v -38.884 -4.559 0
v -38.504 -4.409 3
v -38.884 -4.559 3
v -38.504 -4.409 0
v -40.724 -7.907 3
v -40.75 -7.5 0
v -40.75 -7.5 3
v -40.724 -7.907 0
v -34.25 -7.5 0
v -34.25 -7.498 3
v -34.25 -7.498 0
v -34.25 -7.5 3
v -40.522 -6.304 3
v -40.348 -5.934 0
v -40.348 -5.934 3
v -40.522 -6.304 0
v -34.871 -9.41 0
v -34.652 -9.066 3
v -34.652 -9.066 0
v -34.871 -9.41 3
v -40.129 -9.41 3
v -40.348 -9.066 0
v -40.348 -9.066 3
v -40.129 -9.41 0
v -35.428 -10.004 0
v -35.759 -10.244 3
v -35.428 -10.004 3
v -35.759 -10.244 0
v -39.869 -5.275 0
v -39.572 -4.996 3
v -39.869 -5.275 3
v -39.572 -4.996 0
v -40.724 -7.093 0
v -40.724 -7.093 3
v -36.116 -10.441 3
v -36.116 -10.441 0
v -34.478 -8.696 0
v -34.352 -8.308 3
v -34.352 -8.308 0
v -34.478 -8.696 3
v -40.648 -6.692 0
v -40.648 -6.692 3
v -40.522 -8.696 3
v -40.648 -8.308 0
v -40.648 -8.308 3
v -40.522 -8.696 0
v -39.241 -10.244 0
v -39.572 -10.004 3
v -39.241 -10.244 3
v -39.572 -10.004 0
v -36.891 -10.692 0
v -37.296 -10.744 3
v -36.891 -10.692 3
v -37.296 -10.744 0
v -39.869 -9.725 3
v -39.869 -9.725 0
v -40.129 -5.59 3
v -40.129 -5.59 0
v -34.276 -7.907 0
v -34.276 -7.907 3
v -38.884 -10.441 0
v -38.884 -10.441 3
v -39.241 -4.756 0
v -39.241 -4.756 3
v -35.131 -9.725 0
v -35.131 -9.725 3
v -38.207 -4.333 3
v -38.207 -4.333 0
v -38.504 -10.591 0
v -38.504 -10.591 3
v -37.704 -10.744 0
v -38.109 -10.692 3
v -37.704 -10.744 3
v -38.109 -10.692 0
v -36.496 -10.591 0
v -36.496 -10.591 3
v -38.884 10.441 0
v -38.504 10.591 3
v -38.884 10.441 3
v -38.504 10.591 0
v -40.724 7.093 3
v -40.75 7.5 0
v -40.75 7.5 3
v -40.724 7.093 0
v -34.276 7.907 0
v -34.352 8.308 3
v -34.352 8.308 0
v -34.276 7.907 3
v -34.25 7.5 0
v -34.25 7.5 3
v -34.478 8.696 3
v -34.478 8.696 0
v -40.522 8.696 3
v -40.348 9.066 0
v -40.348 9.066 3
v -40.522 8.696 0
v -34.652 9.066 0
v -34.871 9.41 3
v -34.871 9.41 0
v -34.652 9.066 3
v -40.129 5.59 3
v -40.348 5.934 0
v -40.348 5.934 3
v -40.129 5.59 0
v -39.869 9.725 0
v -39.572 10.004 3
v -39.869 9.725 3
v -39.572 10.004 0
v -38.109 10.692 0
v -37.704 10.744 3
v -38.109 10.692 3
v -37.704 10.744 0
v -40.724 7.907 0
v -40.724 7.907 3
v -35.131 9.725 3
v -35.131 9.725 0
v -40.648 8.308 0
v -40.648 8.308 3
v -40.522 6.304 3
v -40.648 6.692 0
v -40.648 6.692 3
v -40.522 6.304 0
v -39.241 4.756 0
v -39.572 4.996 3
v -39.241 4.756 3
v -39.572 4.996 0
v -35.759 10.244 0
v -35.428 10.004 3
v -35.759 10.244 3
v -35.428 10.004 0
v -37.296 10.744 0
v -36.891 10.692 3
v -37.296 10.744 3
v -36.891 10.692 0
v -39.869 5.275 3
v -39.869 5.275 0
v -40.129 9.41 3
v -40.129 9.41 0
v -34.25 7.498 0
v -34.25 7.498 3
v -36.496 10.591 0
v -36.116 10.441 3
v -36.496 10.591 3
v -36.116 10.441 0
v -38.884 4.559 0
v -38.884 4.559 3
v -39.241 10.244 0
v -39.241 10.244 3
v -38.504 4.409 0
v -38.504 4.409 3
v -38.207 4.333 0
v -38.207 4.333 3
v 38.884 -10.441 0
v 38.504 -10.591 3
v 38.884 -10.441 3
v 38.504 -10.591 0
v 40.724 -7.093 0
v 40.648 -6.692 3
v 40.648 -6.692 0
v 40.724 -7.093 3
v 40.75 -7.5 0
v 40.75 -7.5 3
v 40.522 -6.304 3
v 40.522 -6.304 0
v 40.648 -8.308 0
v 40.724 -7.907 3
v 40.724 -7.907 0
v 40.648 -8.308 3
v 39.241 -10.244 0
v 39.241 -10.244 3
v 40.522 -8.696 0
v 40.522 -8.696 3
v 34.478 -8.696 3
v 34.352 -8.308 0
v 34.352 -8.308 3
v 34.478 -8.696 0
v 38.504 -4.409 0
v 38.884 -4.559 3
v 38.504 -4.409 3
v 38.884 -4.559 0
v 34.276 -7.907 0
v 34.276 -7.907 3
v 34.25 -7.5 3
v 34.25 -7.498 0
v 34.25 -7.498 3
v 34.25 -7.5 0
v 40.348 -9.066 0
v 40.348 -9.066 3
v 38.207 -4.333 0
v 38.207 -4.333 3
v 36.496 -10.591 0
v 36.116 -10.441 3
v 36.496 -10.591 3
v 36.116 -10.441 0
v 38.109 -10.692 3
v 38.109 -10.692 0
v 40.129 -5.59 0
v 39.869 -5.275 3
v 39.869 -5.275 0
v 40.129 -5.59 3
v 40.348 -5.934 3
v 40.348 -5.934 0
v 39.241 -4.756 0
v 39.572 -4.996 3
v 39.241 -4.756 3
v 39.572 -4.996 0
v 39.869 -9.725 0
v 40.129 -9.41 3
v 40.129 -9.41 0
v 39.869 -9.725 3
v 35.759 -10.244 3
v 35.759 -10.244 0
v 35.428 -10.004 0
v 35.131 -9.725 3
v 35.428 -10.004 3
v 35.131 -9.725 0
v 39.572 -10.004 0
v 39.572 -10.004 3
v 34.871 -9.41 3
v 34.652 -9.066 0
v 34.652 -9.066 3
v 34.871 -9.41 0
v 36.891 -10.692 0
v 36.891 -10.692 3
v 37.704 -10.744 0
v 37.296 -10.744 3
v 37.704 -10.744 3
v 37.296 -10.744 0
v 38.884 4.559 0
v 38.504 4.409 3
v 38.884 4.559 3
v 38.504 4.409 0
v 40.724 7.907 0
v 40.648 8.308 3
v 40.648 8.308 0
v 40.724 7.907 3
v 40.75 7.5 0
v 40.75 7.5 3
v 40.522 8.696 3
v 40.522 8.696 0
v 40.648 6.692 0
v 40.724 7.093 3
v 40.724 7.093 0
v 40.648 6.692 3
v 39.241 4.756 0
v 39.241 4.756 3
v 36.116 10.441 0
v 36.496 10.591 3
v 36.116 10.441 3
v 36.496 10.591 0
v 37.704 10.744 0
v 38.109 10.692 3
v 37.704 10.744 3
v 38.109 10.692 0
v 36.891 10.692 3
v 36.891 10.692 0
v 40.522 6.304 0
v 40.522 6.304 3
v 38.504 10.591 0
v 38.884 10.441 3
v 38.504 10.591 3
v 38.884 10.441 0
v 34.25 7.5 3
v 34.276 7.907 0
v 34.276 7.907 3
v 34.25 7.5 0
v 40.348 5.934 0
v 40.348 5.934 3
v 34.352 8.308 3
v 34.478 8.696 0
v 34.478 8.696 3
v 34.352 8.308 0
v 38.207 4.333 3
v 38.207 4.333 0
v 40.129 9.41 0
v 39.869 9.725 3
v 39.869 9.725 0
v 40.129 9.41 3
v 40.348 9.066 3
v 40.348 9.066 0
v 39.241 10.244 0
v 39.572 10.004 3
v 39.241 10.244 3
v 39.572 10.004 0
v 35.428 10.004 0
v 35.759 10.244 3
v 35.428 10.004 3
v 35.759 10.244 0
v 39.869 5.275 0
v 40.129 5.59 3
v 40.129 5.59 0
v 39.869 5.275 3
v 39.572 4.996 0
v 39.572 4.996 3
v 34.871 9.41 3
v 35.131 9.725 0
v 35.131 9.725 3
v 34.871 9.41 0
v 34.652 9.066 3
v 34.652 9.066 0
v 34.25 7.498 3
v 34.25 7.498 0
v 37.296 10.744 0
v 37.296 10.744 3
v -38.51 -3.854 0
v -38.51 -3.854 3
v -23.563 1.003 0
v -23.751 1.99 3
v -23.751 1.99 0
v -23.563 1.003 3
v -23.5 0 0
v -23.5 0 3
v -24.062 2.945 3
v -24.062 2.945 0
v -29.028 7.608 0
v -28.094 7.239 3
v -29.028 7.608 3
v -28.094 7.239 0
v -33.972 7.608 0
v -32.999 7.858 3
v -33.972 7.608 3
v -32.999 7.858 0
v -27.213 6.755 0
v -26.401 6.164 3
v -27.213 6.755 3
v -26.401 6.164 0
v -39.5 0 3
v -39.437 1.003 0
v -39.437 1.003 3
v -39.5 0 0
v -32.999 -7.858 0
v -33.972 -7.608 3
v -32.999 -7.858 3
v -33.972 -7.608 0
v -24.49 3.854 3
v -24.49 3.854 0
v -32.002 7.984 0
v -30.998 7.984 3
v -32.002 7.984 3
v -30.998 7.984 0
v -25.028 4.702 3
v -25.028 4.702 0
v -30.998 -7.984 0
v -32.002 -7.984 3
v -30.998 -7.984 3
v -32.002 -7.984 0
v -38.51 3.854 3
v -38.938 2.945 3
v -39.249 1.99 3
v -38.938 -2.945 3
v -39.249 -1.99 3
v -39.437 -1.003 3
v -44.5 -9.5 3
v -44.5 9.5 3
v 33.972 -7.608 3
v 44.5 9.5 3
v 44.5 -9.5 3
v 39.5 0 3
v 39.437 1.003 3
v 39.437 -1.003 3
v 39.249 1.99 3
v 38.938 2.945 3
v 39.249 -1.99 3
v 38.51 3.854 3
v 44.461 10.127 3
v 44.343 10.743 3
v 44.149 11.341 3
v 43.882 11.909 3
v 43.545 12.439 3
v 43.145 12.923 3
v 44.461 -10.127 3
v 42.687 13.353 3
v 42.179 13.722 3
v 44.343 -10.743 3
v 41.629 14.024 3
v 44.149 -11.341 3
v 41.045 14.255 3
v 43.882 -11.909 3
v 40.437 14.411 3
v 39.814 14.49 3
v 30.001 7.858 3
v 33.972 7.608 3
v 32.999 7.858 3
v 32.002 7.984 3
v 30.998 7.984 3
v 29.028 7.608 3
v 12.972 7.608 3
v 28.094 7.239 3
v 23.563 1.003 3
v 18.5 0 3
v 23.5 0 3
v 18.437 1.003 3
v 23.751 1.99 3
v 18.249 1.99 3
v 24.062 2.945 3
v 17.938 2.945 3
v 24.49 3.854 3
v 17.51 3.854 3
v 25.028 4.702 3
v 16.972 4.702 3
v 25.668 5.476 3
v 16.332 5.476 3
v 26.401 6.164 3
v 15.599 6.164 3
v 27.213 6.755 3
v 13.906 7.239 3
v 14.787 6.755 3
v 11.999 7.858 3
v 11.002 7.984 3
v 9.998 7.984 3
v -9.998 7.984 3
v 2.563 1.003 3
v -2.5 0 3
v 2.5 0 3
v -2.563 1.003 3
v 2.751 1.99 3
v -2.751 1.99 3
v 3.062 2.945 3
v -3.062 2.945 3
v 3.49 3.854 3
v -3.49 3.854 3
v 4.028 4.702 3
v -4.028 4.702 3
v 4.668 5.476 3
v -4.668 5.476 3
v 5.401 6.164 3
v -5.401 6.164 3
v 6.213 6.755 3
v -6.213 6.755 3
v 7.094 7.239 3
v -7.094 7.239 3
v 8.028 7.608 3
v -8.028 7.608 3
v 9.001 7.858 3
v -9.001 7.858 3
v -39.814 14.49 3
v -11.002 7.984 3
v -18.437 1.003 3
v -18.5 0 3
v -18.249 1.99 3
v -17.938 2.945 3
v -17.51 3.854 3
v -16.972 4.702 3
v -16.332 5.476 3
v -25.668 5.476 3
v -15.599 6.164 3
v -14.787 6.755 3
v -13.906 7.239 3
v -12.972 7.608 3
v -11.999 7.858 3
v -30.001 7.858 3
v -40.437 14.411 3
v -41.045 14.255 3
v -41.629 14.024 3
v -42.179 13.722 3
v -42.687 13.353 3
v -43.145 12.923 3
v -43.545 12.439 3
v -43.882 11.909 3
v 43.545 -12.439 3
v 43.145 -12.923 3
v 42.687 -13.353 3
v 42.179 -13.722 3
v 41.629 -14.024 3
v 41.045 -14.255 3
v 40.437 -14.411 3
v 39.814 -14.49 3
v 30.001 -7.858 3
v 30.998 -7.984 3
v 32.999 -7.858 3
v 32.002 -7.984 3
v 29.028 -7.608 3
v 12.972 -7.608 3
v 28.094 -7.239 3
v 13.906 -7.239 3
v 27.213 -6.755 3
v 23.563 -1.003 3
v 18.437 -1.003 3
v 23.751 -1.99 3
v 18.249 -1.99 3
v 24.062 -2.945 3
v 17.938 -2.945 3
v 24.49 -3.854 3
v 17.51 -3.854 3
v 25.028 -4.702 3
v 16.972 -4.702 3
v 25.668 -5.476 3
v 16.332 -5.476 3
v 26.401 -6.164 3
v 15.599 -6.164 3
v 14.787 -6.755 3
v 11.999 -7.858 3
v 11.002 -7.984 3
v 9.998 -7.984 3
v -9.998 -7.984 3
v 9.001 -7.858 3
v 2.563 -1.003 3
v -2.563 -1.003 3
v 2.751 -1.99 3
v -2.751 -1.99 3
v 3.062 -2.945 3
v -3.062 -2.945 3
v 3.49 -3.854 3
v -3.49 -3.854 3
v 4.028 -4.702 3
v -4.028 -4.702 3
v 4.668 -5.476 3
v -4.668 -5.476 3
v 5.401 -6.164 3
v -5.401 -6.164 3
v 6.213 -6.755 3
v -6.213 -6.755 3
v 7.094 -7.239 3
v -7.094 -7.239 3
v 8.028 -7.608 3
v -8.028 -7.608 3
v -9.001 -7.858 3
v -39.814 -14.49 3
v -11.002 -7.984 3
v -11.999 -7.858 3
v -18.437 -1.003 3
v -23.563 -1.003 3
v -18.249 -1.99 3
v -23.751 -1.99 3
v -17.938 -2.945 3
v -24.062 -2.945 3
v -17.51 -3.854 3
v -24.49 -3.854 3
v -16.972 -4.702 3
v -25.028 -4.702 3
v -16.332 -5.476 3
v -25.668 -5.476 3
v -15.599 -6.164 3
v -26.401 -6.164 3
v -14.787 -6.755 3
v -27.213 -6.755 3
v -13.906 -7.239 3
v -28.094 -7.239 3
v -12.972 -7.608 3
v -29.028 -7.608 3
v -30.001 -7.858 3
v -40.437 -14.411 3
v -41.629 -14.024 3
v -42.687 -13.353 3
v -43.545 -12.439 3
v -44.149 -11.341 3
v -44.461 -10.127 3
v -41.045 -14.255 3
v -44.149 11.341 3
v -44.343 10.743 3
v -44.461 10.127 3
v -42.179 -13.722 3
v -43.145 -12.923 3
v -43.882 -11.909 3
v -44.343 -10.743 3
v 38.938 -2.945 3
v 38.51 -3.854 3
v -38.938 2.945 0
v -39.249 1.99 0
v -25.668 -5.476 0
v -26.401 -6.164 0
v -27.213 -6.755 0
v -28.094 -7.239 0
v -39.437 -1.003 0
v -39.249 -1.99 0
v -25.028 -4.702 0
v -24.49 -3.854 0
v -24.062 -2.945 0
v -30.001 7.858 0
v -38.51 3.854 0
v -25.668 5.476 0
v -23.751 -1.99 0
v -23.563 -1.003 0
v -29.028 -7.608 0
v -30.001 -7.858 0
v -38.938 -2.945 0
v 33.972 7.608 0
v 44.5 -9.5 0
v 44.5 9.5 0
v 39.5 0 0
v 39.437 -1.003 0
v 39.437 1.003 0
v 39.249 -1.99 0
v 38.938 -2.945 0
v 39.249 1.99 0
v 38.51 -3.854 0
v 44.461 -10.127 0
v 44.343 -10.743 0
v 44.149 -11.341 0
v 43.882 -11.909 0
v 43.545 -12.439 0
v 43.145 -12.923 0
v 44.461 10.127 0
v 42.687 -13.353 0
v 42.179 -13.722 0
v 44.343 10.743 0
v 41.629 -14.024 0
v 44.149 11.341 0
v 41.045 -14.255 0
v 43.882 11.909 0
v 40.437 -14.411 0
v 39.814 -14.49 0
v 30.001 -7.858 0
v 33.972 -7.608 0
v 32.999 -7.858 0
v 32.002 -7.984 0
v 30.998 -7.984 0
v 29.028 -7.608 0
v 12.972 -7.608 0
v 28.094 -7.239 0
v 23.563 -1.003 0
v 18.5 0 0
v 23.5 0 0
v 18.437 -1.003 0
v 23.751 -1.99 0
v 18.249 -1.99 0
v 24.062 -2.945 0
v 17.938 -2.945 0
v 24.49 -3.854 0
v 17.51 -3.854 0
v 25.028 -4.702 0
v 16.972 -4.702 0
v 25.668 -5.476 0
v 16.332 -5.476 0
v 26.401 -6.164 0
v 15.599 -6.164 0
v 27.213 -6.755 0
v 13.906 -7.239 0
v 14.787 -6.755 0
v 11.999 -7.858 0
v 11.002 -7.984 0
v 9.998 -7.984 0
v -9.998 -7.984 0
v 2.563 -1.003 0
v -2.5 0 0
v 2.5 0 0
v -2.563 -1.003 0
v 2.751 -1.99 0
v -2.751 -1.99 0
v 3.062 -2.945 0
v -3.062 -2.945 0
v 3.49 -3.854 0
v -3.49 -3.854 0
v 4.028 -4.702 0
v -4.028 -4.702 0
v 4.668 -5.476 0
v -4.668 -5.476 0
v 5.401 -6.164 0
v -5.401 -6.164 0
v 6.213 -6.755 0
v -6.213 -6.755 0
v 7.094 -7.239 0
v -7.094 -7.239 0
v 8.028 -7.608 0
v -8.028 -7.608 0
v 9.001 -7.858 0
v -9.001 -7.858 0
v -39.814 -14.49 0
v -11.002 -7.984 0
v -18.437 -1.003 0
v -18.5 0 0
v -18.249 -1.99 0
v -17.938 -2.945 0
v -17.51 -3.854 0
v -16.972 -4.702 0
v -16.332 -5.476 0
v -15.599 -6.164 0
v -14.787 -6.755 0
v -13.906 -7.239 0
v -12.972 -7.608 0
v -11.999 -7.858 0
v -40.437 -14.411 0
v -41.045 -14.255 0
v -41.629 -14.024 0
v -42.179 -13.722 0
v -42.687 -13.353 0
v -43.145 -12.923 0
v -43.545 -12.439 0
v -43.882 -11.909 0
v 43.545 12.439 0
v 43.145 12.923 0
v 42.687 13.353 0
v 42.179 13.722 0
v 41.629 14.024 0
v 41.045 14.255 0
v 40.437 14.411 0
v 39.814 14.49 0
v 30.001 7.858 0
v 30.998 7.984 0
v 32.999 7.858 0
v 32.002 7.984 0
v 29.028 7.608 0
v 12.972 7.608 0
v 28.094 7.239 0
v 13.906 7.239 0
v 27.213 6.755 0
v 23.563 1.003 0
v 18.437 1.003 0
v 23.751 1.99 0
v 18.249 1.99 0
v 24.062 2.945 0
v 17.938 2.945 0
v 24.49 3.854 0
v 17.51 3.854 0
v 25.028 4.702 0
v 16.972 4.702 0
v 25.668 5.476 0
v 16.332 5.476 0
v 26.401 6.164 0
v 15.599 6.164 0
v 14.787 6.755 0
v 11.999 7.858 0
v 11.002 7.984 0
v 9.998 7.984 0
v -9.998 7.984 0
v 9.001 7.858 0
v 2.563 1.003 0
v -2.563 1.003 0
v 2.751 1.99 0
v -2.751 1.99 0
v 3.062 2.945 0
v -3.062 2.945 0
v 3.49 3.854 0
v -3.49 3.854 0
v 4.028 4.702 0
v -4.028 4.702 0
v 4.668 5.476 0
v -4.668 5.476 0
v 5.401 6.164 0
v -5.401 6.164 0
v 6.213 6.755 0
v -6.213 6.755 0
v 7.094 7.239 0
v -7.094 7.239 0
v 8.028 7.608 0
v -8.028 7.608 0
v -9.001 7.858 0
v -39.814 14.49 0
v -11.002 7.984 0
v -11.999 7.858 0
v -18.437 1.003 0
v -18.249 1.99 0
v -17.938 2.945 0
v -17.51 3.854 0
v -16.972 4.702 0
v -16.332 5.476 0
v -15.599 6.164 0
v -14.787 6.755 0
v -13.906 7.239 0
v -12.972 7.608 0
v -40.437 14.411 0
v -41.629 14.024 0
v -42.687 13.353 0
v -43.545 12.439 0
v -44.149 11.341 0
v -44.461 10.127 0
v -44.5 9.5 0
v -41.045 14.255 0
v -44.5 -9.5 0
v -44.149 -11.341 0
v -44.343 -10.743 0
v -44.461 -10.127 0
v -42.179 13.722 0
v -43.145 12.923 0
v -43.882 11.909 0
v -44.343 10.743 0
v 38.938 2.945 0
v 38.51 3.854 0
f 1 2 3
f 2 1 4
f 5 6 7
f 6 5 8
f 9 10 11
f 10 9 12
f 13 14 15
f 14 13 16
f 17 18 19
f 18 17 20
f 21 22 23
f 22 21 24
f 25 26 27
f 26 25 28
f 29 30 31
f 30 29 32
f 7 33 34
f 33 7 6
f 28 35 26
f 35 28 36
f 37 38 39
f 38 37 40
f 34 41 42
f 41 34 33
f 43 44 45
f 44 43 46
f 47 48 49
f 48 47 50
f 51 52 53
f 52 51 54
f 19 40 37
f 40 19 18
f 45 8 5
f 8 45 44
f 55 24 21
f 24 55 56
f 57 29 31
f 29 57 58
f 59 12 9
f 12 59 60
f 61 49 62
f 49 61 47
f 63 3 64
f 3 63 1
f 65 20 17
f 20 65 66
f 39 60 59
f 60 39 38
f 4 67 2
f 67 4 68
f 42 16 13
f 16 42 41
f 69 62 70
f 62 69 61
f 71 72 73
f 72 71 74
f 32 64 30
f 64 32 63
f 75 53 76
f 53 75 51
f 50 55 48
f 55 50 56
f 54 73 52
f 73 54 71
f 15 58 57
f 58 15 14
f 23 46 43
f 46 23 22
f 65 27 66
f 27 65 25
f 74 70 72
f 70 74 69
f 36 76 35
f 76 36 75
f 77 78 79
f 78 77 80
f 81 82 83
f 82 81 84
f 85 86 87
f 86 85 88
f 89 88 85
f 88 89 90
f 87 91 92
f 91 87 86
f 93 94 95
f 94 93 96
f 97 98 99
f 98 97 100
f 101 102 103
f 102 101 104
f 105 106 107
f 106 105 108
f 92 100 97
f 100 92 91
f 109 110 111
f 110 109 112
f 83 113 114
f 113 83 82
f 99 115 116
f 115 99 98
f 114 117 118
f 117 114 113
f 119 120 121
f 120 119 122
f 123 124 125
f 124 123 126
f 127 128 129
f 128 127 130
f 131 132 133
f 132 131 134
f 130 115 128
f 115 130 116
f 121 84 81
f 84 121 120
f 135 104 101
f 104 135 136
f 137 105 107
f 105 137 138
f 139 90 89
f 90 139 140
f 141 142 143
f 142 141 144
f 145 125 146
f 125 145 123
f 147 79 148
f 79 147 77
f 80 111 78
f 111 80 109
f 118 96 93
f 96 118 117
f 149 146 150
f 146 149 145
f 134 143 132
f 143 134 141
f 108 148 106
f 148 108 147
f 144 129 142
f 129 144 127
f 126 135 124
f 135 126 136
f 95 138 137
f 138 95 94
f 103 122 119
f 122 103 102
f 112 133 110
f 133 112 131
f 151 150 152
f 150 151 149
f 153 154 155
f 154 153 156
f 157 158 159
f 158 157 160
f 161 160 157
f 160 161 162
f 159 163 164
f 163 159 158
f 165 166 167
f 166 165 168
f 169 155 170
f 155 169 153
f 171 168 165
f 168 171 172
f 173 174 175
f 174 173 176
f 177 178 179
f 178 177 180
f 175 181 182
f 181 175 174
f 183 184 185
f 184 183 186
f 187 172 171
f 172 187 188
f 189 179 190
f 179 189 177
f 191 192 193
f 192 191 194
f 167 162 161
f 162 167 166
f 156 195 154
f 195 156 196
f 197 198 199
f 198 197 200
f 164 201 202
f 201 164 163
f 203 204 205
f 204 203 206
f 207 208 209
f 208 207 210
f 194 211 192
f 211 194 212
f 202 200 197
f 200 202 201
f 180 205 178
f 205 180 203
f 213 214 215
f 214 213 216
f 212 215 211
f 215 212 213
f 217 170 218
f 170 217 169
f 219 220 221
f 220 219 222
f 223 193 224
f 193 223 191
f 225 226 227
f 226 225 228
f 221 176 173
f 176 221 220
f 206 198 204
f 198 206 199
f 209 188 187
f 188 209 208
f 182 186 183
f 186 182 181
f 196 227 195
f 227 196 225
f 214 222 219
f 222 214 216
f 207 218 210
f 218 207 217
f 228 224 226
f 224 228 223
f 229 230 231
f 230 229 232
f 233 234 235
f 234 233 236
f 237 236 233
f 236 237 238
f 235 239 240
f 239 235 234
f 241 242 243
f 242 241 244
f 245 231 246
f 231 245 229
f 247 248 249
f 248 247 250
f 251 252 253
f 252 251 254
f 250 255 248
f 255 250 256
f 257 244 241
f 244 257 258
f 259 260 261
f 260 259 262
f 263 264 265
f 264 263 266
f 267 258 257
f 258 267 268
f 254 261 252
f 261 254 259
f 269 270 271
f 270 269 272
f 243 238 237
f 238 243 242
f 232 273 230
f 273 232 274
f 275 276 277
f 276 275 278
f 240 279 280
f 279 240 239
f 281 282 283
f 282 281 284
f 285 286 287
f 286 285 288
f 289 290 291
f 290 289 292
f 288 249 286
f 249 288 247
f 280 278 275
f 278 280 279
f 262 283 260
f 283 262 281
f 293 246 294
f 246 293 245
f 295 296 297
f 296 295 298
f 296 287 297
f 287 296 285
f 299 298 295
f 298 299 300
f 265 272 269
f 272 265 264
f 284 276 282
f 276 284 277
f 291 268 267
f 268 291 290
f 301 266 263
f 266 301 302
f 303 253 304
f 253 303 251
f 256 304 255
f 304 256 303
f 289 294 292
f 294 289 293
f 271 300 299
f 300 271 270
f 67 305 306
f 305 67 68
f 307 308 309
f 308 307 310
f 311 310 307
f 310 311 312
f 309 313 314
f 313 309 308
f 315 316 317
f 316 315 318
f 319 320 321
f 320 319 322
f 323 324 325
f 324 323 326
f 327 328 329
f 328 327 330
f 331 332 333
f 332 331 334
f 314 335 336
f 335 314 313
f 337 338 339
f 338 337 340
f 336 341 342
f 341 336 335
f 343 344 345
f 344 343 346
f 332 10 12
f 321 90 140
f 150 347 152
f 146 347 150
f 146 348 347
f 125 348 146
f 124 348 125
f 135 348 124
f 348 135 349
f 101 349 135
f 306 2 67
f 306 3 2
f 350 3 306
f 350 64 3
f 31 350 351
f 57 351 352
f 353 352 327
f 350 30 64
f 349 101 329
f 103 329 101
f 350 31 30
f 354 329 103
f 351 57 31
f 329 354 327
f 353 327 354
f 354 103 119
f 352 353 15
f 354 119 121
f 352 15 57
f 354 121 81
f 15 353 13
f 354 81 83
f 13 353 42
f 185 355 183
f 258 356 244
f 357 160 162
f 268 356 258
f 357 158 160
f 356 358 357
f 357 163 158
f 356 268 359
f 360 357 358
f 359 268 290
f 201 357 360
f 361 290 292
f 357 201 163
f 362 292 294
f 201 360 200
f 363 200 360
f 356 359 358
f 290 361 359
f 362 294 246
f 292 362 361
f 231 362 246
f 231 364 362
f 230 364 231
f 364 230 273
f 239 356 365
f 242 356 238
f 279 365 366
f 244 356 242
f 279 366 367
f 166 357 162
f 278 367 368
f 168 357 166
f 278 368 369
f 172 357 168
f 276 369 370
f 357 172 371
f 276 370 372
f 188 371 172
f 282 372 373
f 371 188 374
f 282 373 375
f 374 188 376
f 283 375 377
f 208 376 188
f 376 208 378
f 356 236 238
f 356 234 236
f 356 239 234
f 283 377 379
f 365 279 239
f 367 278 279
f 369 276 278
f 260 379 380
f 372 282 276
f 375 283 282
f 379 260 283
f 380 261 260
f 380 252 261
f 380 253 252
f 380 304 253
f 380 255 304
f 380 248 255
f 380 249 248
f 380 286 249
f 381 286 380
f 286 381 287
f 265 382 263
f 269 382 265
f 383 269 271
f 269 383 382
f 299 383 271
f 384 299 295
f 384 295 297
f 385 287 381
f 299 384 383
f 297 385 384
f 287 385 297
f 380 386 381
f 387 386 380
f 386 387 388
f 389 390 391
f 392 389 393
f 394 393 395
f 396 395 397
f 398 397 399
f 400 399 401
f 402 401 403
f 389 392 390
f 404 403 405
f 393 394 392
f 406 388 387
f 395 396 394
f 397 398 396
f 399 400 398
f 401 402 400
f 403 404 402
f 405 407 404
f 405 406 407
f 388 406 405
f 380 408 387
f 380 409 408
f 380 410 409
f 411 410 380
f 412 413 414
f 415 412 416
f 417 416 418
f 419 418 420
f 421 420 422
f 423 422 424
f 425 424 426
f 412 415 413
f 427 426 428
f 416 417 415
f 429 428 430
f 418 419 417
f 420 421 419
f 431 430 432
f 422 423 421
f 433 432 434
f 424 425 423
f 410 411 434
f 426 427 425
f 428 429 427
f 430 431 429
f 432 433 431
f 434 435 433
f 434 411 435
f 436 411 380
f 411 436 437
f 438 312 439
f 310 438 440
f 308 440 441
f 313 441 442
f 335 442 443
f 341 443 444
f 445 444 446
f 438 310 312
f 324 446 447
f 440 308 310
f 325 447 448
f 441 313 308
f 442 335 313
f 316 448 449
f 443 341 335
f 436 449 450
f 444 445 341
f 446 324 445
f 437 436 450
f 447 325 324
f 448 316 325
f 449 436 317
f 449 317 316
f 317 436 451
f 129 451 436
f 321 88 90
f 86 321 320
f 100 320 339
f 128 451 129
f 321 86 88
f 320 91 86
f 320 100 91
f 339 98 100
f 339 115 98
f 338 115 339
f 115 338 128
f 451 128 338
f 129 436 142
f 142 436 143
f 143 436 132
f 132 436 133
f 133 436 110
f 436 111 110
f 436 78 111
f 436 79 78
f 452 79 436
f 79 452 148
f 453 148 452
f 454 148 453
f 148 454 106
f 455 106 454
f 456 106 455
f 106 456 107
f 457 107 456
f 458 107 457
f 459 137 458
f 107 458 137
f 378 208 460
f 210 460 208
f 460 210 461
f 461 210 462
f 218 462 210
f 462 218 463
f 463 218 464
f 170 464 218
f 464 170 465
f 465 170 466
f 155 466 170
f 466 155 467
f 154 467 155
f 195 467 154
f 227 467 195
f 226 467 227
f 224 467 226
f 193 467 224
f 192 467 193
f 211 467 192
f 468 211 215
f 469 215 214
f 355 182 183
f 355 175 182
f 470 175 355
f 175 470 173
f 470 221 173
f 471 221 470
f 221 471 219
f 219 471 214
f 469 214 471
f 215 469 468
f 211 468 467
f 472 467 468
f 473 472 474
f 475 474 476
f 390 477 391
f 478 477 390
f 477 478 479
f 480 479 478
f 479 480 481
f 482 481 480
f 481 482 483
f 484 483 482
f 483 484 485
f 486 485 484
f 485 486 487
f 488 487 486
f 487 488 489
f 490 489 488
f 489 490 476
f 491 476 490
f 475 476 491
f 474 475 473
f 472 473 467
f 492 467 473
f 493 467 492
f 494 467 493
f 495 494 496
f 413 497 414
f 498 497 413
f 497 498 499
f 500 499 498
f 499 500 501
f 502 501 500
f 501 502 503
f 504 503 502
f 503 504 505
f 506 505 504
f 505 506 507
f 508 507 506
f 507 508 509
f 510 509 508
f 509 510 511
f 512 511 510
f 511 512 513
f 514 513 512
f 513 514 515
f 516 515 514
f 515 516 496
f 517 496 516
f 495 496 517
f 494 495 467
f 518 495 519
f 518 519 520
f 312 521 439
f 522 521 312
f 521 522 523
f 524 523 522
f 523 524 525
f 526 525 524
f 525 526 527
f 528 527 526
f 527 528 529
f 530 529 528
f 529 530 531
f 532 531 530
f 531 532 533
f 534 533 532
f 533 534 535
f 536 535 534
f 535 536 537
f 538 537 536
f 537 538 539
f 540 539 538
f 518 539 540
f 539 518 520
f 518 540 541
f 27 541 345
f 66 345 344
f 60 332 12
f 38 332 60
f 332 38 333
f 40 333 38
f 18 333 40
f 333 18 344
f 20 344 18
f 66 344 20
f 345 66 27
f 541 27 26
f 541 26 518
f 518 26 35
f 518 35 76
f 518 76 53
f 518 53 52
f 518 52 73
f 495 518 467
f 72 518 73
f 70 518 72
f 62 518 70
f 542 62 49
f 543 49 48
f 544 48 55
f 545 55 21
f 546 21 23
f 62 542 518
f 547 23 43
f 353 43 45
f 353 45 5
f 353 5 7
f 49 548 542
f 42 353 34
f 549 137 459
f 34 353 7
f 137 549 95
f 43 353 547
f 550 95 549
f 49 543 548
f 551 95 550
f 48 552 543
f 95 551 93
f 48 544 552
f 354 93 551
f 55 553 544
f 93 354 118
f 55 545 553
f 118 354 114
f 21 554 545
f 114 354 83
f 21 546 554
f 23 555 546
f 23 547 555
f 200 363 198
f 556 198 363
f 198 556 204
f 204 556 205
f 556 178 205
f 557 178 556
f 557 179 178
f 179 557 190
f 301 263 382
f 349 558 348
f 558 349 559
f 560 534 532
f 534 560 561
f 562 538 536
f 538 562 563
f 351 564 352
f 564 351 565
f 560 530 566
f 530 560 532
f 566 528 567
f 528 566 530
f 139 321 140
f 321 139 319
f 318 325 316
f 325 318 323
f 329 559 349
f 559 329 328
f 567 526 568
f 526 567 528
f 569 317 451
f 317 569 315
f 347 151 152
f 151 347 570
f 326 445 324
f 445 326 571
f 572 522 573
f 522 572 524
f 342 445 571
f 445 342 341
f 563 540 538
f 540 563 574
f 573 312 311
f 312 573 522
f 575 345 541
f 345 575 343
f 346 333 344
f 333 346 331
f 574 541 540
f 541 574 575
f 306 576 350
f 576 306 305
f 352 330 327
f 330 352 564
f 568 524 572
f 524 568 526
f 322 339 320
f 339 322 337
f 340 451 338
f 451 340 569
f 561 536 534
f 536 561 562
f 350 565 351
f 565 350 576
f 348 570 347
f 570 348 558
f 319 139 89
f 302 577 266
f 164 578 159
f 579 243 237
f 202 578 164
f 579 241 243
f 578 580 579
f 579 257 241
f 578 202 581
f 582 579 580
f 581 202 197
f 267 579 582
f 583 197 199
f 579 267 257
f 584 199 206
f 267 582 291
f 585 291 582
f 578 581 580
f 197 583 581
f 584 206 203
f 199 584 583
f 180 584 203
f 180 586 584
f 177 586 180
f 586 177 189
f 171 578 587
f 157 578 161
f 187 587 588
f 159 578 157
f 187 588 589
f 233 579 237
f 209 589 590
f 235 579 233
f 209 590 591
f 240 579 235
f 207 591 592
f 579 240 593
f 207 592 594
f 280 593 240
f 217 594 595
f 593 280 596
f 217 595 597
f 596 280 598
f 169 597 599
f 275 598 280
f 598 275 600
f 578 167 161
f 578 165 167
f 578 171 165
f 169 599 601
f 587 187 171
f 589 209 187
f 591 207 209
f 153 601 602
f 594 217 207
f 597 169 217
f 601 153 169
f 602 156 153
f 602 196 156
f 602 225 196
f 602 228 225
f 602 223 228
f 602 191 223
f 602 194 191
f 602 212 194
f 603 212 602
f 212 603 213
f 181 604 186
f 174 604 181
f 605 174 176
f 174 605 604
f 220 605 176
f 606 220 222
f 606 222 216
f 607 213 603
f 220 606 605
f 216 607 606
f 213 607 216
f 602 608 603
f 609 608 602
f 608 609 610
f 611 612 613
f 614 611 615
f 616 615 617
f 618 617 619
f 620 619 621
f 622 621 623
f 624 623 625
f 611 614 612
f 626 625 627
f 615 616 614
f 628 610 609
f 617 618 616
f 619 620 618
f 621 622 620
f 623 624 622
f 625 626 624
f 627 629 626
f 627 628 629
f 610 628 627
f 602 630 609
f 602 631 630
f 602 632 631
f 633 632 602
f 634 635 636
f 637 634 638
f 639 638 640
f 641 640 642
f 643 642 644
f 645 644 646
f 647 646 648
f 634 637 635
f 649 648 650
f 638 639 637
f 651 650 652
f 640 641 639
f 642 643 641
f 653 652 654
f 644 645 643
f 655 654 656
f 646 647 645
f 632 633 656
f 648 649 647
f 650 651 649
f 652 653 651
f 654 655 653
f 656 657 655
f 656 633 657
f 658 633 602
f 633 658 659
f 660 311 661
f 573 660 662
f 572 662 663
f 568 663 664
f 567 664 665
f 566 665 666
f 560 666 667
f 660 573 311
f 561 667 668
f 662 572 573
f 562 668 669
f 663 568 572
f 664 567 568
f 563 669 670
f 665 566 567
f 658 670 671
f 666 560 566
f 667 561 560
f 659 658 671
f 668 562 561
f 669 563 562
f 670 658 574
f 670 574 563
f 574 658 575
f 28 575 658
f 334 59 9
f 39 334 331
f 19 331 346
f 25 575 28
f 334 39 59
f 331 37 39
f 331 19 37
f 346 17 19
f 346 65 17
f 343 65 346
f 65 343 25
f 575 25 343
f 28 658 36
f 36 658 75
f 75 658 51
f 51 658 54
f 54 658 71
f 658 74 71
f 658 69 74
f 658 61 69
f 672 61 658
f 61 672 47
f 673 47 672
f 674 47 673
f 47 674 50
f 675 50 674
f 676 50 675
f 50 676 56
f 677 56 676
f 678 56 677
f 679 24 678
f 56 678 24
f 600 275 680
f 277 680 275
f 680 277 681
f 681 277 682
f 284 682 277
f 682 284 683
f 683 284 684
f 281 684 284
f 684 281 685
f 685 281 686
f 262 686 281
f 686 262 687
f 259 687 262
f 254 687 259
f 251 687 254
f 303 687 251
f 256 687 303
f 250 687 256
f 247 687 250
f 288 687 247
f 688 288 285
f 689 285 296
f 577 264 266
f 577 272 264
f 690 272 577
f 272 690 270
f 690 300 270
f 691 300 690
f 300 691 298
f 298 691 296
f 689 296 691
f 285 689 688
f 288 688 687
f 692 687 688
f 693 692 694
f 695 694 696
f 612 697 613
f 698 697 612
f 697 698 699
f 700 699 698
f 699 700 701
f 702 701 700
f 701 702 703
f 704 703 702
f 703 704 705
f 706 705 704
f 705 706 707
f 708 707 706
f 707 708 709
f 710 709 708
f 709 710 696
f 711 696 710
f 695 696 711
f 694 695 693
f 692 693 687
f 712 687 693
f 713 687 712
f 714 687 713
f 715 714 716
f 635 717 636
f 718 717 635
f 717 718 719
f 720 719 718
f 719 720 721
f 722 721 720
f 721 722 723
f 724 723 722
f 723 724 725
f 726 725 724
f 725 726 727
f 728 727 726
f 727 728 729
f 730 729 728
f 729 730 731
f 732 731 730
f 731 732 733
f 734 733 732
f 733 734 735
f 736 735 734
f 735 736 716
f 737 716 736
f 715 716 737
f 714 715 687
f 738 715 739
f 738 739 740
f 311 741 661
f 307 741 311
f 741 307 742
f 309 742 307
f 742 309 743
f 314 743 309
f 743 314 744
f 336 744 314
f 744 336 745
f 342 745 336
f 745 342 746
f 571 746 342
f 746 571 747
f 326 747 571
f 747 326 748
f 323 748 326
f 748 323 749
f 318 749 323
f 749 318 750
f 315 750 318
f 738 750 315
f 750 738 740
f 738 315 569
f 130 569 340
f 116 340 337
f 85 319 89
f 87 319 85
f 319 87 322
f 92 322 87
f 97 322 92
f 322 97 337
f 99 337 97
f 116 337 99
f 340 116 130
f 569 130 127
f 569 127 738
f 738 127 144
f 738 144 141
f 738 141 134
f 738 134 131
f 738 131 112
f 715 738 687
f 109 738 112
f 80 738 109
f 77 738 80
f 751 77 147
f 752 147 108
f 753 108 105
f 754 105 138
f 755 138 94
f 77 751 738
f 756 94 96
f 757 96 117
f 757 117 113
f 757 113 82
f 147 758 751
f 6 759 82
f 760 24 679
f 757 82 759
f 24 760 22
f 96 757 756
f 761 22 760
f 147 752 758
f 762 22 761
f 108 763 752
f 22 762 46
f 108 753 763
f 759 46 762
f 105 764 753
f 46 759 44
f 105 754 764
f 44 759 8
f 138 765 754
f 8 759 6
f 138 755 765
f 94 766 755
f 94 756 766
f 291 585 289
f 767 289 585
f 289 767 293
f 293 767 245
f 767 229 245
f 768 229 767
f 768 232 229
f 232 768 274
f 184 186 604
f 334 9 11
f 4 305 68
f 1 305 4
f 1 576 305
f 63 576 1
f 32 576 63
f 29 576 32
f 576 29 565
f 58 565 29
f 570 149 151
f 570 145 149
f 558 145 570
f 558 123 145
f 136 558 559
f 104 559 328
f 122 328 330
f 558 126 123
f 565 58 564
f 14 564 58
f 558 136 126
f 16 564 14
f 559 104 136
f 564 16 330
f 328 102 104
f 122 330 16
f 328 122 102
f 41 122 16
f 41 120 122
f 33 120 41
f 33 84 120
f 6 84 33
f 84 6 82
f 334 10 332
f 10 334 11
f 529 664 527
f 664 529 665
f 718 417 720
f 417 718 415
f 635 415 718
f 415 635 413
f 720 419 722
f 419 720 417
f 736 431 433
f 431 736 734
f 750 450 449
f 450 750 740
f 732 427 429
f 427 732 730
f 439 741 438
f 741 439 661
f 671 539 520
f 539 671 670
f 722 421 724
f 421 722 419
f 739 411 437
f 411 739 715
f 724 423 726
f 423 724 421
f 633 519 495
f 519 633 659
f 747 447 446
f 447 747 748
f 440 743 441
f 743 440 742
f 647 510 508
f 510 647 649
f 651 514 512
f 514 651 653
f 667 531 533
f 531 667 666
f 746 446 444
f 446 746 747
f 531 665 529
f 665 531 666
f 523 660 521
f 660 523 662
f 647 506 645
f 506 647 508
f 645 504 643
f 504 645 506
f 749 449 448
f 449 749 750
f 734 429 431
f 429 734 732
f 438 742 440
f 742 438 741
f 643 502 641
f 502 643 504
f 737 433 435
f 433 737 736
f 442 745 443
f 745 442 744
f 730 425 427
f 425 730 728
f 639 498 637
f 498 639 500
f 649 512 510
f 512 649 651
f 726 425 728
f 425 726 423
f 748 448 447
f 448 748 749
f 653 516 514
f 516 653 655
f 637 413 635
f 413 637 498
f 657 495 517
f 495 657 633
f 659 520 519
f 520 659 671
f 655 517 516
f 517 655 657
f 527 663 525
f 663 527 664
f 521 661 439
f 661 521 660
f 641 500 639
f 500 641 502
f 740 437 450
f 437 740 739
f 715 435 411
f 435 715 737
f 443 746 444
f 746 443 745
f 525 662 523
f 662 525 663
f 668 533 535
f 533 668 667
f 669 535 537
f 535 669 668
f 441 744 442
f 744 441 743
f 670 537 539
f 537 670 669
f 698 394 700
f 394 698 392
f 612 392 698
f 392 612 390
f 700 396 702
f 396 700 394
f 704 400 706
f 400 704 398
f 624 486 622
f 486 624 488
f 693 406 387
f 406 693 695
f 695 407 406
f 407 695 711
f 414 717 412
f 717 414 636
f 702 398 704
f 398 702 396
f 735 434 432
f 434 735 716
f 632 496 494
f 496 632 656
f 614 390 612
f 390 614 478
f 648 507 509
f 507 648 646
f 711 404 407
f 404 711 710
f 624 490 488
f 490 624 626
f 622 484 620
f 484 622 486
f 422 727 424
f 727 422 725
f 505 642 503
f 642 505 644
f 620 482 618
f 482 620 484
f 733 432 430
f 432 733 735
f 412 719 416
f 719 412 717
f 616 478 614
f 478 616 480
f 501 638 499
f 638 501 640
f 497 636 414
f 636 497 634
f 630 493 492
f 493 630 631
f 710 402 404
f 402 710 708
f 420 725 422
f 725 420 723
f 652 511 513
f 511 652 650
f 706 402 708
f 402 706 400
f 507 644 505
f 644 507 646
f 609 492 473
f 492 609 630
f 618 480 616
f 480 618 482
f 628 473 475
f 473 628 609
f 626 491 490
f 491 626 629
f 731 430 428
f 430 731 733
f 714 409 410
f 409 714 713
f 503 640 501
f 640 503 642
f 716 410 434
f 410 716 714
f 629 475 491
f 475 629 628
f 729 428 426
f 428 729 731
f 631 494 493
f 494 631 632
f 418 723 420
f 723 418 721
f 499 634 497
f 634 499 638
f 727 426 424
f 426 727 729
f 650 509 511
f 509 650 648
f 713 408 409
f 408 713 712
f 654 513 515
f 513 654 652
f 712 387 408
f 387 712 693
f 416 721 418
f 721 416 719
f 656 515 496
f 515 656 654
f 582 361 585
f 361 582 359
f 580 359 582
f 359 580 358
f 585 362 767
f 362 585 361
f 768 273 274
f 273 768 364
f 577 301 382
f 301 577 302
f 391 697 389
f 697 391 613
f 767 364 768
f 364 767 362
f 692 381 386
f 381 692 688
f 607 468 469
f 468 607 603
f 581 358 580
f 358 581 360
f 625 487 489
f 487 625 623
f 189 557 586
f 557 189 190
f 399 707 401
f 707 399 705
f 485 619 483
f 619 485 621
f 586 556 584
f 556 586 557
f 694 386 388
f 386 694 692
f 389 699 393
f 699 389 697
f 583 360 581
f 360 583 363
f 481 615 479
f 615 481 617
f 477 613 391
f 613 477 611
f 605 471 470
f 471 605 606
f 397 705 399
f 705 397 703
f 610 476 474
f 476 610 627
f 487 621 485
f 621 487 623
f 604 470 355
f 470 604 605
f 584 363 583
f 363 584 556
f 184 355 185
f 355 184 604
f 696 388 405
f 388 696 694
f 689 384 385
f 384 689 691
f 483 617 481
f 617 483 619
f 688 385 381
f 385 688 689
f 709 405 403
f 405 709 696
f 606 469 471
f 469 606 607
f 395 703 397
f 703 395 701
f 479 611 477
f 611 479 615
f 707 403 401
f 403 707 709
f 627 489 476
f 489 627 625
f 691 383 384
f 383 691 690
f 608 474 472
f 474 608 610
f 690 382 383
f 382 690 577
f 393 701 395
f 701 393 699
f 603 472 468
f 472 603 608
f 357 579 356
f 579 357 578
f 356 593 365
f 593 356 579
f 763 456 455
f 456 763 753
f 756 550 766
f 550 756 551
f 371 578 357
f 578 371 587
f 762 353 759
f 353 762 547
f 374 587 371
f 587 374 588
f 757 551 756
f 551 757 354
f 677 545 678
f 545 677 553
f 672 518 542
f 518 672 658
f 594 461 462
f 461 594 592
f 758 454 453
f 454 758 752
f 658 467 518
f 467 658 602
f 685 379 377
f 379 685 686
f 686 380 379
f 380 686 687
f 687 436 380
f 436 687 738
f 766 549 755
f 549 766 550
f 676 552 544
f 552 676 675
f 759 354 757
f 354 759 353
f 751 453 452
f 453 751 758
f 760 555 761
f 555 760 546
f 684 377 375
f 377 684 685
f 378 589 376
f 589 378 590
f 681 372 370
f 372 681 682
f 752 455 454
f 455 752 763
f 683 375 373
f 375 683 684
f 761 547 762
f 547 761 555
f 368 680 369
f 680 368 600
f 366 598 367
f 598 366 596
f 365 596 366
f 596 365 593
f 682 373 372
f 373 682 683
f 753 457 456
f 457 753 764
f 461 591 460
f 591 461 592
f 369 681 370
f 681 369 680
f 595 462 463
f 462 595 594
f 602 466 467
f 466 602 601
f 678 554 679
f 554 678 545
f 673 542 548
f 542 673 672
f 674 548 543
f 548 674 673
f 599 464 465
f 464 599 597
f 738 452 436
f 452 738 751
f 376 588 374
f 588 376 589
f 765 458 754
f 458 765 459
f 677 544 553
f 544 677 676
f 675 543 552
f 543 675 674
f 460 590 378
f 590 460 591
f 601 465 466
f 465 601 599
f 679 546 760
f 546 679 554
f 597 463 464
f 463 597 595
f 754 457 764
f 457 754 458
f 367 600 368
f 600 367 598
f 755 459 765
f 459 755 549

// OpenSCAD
$fn = 50;

difference() {
	union() {
		hull() {
			translate(v = [-39.5, 9.5, 0]) {
				cylinder(h = 3, r = 5);
			}
			translate(v = [39.5, 9.5, 0]) {
				cylinder(h = 3, r = 5);
			}
			translate(v = [-39.5, -9.5, 0]) {
				cylinder(h = 3, r = 5);
			}
			translate(v = [39.5, -9.5, 0]) {
				cylinder(h = 3, r = 5);
			}
		}
	}
	union() {
		translate(v = [-37.5, -7.5, -100.0]) {
			cylinder(h = 200, r = 3.25);
		}
		translate(v = [-37.5, 7.5, -100.0]) {
			cylinder(h = 200, r = 3.25);
		}
		translate(v = [37.5, -7.5, -100.0]) {
			cylinder(h = 200, r = 3.25);
		}
		translate(v = [37.5, 7.5, -100.0]) {
			cylinder(h = 200, r = 3.25);
		}
		translate(v = [-37.5, -7.5, -100.0]) {
			cylinder(h = 200, r = 1.8);
		}
		translate(v = [-37.5, 7.5, -100.0]) {
			cylinder(h = 200, r = 1.8);
		}
		translate(v = [37.5, -7.5, -100.0]) {
			cylinder(h = 200, r = 1.8);
		}
		translate(v = [37.5, 7.5, -100.0]) {
			cylinder(h = 200, r = 1.8);
		}
		translate(v = [-31.5, 0, 0.0]) {
			cylinder(h = 3, r = 8.0);
		}
		translate(v = [-10.5, 0, 0.0]) {
			cylinder(h = 3, r = 8.0);
		}
		translate(v = [10.5, 0, 0.0]) {
			cylinder(h = 3, r = 8.0);
		}
		translate(v = [31.5, 0, 0.0]) {
			cylinder(h = 3, r = 8.0);
		}
	}
}
